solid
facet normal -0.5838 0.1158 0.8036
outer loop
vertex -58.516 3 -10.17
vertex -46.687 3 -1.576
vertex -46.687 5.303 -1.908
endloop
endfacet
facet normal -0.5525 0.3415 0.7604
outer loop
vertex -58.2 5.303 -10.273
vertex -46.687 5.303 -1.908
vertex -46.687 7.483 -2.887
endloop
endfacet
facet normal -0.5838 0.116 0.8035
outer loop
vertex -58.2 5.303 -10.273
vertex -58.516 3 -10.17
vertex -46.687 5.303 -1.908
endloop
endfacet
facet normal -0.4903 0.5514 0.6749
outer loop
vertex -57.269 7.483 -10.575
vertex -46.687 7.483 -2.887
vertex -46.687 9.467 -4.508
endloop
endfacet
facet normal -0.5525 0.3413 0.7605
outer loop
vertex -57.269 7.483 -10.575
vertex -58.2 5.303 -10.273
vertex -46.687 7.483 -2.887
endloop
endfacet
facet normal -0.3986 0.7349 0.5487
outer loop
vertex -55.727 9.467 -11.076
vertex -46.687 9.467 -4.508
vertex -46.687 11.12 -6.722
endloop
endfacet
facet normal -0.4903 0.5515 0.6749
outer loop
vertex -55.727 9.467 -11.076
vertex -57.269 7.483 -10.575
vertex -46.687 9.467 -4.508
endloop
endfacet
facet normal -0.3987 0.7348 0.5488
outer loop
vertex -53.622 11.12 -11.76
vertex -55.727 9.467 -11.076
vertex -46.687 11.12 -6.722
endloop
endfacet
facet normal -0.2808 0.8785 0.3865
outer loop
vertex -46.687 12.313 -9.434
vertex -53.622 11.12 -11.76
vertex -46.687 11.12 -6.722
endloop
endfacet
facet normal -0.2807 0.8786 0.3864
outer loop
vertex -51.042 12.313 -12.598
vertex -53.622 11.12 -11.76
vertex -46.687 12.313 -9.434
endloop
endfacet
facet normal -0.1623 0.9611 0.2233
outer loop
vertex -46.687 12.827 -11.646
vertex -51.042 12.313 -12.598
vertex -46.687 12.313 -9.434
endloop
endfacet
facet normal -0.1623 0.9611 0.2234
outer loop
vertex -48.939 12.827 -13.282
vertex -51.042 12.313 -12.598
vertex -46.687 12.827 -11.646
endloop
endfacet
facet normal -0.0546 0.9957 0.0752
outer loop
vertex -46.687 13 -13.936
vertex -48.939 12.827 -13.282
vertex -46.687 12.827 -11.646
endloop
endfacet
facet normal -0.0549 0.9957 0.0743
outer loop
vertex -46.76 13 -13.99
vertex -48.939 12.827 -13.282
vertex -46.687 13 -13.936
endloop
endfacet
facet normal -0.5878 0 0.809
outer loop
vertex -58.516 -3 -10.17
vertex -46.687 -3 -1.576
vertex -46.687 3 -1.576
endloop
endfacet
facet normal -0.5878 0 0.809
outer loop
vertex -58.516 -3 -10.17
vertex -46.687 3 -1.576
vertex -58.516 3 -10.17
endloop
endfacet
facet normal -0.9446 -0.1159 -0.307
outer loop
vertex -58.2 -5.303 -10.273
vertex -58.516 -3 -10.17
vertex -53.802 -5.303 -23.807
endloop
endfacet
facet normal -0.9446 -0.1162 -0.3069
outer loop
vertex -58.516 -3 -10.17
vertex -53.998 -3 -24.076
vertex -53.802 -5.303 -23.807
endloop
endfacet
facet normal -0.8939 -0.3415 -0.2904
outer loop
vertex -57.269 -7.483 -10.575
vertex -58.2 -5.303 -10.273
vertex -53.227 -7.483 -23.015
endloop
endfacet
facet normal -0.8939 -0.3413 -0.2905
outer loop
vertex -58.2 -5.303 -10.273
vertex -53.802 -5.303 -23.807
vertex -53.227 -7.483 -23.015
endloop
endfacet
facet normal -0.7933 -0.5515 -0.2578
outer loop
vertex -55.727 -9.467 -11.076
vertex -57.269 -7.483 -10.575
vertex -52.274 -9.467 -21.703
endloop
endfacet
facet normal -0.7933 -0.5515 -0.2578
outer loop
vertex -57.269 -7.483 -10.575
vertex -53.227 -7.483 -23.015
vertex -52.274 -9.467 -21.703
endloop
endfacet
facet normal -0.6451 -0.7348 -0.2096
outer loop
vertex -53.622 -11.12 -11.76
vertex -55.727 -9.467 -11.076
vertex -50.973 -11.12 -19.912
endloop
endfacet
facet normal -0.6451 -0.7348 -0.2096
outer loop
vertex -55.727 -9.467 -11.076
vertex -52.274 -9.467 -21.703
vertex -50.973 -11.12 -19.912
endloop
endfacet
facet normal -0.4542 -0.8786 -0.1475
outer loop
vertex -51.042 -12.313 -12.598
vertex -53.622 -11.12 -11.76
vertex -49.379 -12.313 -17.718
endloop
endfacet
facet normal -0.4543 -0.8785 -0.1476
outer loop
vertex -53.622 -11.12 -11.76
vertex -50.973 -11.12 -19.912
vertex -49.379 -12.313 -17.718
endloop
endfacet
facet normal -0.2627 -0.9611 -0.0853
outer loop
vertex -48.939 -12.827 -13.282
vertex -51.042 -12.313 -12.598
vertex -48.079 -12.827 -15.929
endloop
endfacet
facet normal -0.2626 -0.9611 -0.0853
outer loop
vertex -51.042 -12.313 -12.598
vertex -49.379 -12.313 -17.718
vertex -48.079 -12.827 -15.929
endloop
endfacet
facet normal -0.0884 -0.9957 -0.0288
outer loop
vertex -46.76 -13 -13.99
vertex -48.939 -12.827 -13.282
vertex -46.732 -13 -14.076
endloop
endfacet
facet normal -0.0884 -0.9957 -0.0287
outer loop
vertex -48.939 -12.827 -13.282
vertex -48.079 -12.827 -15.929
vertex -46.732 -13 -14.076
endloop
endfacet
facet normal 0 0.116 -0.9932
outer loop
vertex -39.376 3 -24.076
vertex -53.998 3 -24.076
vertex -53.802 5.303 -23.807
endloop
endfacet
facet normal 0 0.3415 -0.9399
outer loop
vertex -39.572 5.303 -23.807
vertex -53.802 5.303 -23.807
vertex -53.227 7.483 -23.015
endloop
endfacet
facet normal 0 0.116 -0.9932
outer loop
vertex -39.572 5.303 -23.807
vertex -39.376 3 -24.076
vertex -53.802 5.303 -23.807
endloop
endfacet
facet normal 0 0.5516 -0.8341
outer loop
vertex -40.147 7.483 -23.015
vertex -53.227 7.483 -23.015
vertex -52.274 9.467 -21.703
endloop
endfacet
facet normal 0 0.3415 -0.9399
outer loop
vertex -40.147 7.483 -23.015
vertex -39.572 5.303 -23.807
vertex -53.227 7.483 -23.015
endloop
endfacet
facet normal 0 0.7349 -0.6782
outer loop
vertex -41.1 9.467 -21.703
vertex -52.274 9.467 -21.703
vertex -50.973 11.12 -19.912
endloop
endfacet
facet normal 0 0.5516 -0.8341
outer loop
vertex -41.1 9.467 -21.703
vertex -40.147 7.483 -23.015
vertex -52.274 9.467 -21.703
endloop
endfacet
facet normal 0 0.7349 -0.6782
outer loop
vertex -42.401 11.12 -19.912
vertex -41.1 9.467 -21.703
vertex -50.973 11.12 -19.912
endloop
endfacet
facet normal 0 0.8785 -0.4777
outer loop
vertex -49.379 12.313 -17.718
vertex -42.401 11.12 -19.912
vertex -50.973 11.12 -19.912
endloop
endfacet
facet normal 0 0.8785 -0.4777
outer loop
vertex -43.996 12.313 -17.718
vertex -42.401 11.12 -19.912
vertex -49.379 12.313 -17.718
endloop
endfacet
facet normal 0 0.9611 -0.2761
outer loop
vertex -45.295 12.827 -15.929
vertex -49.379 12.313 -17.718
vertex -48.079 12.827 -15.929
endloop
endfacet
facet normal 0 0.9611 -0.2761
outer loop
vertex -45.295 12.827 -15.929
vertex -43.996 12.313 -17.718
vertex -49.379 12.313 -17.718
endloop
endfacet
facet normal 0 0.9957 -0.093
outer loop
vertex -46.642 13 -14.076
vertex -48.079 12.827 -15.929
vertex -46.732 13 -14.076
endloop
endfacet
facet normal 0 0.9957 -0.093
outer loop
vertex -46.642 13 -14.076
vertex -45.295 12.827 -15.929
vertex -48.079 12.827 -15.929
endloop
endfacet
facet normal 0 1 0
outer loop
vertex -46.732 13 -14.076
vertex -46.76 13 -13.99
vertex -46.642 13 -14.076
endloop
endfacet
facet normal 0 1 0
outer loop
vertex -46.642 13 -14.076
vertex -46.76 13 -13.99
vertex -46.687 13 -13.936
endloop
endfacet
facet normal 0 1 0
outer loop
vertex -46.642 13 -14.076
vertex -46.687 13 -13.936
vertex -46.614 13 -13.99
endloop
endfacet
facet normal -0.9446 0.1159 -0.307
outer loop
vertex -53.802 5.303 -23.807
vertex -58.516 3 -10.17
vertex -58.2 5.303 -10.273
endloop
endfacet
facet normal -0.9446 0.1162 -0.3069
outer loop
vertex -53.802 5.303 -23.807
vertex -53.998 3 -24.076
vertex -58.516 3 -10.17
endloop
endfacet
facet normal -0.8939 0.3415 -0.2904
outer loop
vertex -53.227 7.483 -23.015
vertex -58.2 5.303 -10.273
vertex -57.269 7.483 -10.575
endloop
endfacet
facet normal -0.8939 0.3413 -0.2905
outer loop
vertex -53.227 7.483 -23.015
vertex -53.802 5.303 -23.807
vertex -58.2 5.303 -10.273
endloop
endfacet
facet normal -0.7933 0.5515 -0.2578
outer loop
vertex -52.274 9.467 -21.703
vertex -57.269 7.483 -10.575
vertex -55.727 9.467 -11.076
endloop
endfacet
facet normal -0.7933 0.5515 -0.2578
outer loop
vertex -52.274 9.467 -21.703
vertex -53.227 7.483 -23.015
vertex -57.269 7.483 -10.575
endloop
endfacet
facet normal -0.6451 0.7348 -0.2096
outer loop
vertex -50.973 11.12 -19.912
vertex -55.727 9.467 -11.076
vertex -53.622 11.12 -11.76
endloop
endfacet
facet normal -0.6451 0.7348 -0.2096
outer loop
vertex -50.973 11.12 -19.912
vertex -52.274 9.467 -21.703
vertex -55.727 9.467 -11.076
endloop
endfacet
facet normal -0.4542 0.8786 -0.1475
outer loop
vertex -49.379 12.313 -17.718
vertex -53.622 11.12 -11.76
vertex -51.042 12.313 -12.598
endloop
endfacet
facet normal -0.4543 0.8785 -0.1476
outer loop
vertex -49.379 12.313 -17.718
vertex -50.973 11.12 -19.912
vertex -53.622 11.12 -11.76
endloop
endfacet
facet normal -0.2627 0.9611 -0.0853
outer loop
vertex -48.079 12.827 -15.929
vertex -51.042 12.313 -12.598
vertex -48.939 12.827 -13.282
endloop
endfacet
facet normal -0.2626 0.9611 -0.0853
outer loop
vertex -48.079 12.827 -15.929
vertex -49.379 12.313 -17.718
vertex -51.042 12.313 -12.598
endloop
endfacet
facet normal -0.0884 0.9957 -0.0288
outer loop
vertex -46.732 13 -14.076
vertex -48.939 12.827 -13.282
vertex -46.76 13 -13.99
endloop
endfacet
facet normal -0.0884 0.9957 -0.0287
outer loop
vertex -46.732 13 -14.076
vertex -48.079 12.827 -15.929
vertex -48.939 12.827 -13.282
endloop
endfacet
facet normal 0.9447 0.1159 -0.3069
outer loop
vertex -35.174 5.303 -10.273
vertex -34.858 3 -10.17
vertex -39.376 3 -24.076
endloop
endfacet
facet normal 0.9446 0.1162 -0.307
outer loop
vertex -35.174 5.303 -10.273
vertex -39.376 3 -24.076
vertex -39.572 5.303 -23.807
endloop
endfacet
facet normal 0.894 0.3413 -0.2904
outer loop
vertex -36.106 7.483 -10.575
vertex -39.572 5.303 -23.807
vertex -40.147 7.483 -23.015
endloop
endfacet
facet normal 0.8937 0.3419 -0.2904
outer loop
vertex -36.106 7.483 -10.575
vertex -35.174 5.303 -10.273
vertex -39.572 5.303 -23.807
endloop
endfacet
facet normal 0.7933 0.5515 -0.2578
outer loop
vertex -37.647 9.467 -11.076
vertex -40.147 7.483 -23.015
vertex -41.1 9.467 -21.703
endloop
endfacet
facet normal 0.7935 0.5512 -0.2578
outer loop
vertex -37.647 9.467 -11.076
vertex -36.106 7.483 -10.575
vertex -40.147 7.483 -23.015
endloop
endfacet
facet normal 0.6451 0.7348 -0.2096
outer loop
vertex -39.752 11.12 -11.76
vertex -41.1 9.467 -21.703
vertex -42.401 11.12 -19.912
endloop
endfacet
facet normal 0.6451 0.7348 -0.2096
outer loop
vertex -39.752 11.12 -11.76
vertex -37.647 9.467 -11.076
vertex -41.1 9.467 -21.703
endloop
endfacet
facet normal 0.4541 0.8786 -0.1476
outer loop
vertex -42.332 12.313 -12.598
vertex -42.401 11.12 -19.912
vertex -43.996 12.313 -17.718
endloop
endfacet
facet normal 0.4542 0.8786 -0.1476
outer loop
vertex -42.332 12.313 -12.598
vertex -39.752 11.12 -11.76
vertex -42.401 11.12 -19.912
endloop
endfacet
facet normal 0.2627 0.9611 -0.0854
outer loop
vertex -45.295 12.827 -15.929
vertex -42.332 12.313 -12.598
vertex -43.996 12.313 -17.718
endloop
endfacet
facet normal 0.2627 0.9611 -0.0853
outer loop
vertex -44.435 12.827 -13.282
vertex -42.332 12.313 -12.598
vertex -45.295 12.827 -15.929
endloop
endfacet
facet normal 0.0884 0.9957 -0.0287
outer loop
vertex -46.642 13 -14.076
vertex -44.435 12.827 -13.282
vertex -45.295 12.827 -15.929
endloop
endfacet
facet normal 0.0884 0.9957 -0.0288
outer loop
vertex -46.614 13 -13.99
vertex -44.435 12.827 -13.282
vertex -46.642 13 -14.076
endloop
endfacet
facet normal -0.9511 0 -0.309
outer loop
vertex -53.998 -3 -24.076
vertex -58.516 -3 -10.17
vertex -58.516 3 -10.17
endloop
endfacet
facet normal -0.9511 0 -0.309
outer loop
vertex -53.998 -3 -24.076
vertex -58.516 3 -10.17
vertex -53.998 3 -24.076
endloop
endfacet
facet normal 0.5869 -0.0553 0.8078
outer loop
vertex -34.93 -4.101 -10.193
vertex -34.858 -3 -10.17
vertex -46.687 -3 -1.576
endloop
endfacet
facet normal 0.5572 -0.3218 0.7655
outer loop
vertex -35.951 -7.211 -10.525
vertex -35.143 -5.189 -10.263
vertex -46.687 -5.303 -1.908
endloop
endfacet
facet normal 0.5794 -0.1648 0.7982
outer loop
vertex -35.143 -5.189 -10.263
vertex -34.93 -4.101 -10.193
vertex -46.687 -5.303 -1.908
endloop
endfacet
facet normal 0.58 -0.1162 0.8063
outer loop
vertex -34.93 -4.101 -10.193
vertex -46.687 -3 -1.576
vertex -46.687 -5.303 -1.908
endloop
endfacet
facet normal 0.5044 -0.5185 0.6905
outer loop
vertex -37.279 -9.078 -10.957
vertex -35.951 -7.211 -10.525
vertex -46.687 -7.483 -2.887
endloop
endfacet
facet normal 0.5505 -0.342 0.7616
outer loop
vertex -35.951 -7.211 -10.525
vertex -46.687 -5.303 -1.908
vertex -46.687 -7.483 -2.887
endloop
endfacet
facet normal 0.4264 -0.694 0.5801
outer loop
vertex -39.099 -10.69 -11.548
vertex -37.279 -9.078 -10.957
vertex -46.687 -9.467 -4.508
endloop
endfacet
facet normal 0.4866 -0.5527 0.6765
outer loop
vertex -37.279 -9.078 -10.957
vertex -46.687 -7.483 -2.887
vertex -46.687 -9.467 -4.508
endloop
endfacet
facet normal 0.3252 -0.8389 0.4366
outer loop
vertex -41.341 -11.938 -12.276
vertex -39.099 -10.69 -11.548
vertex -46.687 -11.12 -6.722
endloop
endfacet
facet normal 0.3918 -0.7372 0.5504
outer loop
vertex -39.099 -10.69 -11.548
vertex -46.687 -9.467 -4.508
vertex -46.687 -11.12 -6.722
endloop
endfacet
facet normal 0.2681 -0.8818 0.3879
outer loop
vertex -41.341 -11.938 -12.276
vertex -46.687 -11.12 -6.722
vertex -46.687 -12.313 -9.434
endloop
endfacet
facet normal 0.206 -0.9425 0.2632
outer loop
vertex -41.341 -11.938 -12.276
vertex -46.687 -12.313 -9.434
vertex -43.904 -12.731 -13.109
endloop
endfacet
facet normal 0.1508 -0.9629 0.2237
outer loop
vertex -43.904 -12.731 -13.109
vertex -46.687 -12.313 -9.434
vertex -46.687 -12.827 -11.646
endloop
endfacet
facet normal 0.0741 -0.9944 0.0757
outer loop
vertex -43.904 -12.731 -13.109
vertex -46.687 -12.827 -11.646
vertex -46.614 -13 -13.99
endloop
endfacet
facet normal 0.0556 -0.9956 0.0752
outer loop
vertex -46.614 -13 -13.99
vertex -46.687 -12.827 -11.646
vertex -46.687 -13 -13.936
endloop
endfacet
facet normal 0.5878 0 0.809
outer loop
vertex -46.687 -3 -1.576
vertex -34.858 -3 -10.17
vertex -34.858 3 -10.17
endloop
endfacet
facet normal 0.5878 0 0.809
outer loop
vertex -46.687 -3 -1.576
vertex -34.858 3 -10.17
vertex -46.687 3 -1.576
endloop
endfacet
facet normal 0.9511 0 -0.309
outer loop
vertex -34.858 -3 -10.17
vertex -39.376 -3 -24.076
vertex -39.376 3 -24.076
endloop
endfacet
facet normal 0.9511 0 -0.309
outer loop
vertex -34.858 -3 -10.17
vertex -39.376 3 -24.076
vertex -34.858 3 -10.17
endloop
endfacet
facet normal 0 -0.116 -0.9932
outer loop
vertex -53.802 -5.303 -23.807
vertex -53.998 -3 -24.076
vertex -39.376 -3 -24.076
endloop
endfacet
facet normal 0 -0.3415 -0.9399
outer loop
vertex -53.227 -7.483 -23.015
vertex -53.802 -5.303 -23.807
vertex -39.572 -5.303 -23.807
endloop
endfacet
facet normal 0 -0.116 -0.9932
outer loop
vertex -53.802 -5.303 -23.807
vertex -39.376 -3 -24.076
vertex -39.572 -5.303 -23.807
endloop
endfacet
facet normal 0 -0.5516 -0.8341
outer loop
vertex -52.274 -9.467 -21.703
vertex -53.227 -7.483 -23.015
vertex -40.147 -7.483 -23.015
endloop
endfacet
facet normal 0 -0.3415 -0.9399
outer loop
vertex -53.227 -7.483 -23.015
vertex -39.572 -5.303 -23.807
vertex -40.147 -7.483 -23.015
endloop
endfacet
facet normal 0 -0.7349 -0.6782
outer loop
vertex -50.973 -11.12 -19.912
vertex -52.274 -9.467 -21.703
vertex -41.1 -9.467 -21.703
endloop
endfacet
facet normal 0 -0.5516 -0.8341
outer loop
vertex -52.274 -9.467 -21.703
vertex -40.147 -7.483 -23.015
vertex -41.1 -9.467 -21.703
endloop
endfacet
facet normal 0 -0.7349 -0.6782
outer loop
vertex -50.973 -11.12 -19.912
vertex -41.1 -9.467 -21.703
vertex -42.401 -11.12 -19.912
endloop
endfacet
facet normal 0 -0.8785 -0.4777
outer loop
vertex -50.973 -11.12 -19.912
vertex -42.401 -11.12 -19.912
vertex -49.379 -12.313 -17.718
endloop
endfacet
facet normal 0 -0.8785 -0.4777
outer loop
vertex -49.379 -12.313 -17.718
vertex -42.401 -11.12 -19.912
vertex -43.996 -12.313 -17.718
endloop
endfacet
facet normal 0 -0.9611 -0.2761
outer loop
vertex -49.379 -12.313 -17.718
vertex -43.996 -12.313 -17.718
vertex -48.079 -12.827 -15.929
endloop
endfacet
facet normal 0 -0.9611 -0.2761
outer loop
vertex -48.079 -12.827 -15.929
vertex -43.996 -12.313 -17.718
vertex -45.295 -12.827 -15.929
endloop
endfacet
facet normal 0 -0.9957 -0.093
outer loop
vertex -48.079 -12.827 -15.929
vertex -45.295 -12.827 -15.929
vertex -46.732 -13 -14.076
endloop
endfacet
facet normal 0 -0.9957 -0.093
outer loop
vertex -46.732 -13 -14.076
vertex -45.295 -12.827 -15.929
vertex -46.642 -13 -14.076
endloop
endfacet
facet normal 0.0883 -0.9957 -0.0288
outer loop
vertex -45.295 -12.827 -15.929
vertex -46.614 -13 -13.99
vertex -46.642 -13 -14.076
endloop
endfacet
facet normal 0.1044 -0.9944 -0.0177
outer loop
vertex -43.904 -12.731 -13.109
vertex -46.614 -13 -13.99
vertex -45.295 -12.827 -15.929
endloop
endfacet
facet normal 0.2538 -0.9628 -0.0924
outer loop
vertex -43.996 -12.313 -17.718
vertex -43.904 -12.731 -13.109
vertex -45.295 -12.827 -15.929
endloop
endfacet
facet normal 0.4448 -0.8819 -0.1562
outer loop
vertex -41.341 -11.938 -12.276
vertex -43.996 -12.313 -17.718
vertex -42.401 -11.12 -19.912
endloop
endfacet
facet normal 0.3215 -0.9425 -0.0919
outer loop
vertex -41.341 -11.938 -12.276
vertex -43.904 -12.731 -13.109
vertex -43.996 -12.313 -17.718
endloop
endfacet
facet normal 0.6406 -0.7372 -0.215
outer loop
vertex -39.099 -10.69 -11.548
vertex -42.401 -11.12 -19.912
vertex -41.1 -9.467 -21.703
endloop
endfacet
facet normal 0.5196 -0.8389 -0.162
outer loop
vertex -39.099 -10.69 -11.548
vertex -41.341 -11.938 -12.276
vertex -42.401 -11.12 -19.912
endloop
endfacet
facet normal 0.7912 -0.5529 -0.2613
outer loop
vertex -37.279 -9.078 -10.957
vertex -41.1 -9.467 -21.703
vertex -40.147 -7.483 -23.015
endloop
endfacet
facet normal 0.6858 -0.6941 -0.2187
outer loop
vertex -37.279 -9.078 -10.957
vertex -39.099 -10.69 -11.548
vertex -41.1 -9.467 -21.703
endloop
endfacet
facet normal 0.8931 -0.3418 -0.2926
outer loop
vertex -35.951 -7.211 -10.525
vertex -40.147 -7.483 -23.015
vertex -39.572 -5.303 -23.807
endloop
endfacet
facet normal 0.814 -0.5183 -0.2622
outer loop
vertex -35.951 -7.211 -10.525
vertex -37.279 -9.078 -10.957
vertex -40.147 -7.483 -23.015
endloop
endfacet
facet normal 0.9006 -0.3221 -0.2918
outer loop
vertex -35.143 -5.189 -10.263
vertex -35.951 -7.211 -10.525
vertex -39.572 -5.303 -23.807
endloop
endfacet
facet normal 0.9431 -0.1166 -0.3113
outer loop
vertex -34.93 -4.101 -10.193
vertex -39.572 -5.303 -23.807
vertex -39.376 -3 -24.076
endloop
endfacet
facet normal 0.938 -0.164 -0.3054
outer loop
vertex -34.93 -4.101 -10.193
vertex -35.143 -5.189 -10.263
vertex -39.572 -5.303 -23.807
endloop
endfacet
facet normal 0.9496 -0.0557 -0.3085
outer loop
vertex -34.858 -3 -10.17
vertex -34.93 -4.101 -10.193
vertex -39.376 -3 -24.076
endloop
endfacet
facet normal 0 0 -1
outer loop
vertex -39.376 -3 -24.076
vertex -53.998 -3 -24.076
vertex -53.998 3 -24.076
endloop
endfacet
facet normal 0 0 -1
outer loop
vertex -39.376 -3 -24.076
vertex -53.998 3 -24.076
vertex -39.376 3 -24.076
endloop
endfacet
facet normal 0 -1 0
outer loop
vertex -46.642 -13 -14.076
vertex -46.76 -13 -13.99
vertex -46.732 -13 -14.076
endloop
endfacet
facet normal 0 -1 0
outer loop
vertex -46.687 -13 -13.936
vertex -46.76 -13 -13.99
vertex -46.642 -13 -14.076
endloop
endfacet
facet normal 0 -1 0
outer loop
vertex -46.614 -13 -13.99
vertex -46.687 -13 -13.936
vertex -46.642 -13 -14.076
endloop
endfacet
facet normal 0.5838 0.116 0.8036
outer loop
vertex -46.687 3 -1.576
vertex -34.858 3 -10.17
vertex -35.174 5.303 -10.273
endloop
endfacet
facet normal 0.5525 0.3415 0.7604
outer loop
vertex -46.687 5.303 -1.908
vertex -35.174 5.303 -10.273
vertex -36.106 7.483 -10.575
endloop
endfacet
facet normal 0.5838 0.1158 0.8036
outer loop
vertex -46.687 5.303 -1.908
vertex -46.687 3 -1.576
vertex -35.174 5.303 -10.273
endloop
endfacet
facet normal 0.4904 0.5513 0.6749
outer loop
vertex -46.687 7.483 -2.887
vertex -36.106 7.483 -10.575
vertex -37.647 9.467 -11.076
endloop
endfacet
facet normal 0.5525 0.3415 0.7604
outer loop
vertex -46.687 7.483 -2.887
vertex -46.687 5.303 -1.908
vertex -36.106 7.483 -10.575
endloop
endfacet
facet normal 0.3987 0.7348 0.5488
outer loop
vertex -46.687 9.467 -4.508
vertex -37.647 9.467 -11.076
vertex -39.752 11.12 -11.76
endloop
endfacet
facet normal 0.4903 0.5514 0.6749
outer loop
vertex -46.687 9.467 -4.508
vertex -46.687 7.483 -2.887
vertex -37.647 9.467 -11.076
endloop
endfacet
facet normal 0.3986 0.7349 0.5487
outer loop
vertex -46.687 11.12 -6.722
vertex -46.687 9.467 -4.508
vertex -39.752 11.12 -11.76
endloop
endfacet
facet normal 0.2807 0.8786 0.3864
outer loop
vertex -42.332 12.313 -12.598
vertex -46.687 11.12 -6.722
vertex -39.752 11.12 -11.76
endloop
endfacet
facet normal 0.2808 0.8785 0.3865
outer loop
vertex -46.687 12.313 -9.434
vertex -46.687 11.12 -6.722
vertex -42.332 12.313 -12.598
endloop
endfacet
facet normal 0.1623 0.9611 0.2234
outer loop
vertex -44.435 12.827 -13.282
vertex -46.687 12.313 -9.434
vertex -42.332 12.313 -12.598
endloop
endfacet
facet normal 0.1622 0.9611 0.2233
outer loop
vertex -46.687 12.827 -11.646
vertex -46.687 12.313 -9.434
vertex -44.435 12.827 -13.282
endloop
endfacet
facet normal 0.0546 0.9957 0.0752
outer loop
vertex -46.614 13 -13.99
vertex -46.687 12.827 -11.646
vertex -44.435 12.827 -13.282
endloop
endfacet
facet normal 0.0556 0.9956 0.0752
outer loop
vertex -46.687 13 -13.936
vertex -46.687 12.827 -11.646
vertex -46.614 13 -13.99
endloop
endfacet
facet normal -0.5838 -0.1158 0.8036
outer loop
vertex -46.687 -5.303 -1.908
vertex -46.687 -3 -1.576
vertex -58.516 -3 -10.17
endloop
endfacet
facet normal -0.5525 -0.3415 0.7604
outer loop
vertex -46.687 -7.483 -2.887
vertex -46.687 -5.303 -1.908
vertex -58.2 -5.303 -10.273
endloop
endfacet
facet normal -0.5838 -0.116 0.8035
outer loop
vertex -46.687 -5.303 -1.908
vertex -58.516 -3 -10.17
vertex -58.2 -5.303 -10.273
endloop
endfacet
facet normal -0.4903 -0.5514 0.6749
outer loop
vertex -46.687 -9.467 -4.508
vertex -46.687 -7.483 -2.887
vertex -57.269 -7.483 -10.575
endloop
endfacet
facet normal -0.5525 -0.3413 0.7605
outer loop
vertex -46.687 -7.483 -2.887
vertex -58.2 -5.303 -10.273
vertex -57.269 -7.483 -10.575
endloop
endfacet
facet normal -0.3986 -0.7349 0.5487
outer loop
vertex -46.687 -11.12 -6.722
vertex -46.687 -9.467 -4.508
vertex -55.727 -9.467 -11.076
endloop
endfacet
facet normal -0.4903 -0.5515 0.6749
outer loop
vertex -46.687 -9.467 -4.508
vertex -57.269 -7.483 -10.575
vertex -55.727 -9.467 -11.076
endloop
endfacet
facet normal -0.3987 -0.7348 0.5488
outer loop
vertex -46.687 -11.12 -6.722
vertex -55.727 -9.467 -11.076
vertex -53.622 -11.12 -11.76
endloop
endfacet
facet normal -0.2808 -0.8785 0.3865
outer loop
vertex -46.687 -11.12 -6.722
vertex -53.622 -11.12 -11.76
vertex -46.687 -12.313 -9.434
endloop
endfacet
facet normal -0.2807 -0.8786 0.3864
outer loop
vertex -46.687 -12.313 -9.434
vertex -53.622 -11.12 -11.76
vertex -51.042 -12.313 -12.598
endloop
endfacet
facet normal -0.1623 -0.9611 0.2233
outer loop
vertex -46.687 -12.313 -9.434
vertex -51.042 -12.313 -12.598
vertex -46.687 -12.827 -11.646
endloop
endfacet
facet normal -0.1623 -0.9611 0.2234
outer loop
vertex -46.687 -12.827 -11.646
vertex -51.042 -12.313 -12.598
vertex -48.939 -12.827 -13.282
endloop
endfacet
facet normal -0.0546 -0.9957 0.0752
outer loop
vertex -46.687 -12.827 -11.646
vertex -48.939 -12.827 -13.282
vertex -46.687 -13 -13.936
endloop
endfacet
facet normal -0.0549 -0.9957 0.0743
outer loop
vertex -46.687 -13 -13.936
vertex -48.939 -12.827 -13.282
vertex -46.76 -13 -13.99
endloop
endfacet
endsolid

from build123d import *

# Parameters (mm, degrees)
F1_DEPTH      = 13
F1_DEPTH_BACK = 13
F2_R          = 10


with BuildPart() as f1:
    # F0 (on Front) → F1 (new body, two sides)
    with BuildSketch(Plane.XZ) as f1_sk:
        Polygon((-53.997823, -24.075741), (-39.376436, -24.075741), (-34.858179, -10.169976), (-46.687129, -1.575741), (-58.516079, -10.169976), align=None)
    extrude(amount=F1_DEPTH)
    extrude(f1_sk.sketch, amount=-F1_DEPTH_BACK)

    # F2
    f2_edges = [f1.edges().sort_by_distance(p)[0] for p in [
        (-52.601604, -13, -5.872858),
        (-56.256951, -13, -17.122858),
        (-46.687129, -13, -24.075741),
        (-37.117308, -13, -17.122858),
        (-40.772654, -13, -5.872858),
        (-52.601604, 13, -5.872858),
        (-56.256951, 13, -17.122858),
        (-46.687129, 13, -24.075741),
        (-37.117308, 13, -17.122858),
        (-40.772654, 13, -5.872858),
    ]]
    fillet(f2_edges, radius=F2_R)


solid = f1.part
